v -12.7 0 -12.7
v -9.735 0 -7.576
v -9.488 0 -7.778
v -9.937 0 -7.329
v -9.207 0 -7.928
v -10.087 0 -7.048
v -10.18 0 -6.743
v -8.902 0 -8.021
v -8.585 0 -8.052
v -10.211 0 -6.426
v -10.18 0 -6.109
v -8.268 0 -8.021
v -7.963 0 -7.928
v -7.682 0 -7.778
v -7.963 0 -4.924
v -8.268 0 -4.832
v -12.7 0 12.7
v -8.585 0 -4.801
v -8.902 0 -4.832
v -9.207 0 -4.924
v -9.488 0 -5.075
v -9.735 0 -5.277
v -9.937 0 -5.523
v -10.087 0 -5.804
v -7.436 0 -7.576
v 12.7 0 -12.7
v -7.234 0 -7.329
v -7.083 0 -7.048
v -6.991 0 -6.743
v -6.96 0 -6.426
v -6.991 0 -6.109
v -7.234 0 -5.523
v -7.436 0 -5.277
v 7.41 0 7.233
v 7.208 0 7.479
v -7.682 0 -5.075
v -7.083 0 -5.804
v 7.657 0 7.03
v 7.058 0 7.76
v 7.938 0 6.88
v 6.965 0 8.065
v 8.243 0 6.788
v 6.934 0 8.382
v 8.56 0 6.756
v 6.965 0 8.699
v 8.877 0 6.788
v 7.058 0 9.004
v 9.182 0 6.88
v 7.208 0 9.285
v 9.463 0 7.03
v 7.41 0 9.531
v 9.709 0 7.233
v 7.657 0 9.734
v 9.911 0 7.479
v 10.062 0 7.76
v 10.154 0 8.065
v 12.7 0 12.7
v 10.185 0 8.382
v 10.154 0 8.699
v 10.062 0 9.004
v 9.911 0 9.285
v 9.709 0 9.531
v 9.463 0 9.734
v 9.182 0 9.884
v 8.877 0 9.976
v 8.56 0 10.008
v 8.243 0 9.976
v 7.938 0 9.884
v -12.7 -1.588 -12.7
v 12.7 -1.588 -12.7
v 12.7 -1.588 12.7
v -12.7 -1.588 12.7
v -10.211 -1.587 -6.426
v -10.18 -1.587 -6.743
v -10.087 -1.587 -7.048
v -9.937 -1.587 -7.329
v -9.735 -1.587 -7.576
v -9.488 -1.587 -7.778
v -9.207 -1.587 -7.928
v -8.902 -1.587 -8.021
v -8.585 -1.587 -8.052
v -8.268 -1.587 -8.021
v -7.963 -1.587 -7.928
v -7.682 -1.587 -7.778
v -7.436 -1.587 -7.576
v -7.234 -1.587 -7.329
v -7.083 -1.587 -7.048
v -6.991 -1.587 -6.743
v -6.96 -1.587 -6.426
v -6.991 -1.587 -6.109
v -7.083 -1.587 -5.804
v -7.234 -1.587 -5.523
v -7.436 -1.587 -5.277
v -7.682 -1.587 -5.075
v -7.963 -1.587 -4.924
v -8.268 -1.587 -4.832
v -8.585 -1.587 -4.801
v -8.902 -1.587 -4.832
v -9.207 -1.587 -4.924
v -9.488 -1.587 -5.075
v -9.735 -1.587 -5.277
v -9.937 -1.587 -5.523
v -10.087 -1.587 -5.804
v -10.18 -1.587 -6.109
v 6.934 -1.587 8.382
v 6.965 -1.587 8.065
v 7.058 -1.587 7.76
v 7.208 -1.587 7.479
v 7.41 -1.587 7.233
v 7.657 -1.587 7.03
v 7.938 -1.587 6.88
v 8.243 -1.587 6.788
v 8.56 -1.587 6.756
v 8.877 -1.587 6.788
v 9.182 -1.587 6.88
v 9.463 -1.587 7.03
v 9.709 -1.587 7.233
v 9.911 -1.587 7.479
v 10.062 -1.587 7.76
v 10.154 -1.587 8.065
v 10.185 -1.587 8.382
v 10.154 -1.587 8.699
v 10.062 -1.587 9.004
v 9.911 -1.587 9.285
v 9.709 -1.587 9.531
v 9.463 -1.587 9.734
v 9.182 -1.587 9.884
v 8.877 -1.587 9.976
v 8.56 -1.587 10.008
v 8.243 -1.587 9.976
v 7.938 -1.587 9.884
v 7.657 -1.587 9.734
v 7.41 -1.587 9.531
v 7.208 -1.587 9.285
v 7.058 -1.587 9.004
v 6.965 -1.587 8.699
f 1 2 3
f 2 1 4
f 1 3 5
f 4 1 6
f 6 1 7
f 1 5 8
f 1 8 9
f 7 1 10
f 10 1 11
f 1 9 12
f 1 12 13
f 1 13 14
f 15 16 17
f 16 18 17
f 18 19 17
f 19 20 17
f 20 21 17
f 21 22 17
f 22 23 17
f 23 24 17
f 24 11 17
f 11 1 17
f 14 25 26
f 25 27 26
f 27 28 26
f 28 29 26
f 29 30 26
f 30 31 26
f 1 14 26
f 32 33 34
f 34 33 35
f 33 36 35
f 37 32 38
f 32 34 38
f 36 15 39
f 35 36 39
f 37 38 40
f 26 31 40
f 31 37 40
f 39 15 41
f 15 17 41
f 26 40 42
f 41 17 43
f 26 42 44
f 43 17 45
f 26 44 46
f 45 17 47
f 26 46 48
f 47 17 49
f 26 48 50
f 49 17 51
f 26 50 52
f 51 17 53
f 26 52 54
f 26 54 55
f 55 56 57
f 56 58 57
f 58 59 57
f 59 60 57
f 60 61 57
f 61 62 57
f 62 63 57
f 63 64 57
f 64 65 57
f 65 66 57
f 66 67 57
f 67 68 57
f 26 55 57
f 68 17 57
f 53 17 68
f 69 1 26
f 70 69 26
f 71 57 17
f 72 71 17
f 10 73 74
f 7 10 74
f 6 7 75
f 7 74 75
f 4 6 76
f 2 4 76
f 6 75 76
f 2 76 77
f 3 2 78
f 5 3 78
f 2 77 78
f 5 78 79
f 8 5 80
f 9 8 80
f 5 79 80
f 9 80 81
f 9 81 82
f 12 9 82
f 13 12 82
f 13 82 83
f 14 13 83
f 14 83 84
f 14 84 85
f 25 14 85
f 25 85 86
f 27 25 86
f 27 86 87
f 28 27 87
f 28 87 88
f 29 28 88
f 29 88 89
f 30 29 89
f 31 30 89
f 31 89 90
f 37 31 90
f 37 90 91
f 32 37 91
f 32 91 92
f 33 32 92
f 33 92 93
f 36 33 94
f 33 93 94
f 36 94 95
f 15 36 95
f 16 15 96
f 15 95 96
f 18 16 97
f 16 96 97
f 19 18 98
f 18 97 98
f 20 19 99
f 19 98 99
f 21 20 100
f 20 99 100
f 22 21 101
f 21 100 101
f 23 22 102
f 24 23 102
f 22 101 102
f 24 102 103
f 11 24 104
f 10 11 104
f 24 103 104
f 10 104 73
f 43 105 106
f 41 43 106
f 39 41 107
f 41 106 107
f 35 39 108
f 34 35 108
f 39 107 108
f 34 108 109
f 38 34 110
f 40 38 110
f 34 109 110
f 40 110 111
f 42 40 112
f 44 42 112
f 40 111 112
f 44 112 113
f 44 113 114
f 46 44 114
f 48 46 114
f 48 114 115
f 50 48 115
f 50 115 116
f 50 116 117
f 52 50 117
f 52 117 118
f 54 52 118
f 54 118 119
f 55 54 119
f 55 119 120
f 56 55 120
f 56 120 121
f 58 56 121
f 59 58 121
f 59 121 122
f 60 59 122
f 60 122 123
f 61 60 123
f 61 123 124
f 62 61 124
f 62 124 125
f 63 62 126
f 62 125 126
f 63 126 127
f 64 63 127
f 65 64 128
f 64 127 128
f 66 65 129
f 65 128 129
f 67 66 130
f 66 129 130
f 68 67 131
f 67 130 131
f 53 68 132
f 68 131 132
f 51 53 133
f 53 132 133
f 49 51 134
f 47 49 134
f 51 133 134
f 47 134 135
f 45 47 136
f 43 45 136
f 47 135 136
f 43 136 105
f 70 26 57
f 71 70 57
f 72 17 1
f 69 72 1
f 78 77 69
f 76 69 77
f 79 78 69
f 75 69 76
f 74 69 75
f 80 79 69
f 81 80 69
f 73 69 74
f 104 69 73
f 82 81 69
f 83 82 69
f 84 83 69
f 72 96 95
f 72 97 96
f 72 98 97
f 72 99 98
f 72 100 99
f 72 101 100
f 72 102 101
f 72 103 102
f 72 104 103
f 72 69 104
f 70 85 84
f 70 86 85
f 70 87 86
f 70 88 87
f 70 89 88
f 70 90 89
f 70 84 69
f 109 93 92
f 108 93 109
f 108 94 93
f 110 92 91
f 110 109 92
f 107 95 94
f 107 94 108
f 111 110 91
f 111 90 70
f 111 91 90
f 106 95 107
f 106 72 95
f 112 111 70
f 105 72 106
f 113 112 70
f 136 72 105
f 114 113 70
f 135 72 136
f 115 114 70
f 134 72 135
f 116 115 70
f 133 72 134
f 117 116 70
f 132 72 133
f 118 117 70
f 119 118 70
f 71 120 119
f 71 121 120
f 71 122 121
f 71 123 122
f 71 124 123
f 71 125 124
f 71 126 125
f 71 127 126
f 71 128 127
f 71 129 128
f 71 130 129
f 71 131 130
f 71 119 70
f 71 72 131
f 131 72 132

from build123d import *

# Parameters (mm, degrees)
F0_W     = 8.5598
F0_H     = 6.2738
F0_W_2   = 4.1402
F1_DEPTH = 1.5875
F2_D     = 3.2512


with BuildPart() as f1:
    # F0 (on Front) → F1 (new body)
    with BuildSketch(Plane.XZ):
        Polygon((0, 12.7), (-12.7, 12.7), (-12.7, -12.7), (0, -12.7), (0, -6.4262), align=None)
        Polygon((12.7, 12.7), (0, 12.7), (0, -6.4262), (8.5598, -6.4262), (12.7, -6.4262), align=None)
        with Locations((4.2799, -9.5631)):
            Rectangle(F0_W, F0_H)
        with Locations((10.6299, -9.5631)):
            Rectangle(F0_W_2, F0_H)
    extrude(amount=F1_DEPTH)

    # F2 (through all)
    with Locations(Plane(origin=(0, 0, 0), x_dir=(1, 0, 0), z_dir=(0, 1, 0))):
        with Locations((8.5598, -8.382), (-8.5852, 6.4262)):
            Hole(F2_D / 2)


solid = f1.part
